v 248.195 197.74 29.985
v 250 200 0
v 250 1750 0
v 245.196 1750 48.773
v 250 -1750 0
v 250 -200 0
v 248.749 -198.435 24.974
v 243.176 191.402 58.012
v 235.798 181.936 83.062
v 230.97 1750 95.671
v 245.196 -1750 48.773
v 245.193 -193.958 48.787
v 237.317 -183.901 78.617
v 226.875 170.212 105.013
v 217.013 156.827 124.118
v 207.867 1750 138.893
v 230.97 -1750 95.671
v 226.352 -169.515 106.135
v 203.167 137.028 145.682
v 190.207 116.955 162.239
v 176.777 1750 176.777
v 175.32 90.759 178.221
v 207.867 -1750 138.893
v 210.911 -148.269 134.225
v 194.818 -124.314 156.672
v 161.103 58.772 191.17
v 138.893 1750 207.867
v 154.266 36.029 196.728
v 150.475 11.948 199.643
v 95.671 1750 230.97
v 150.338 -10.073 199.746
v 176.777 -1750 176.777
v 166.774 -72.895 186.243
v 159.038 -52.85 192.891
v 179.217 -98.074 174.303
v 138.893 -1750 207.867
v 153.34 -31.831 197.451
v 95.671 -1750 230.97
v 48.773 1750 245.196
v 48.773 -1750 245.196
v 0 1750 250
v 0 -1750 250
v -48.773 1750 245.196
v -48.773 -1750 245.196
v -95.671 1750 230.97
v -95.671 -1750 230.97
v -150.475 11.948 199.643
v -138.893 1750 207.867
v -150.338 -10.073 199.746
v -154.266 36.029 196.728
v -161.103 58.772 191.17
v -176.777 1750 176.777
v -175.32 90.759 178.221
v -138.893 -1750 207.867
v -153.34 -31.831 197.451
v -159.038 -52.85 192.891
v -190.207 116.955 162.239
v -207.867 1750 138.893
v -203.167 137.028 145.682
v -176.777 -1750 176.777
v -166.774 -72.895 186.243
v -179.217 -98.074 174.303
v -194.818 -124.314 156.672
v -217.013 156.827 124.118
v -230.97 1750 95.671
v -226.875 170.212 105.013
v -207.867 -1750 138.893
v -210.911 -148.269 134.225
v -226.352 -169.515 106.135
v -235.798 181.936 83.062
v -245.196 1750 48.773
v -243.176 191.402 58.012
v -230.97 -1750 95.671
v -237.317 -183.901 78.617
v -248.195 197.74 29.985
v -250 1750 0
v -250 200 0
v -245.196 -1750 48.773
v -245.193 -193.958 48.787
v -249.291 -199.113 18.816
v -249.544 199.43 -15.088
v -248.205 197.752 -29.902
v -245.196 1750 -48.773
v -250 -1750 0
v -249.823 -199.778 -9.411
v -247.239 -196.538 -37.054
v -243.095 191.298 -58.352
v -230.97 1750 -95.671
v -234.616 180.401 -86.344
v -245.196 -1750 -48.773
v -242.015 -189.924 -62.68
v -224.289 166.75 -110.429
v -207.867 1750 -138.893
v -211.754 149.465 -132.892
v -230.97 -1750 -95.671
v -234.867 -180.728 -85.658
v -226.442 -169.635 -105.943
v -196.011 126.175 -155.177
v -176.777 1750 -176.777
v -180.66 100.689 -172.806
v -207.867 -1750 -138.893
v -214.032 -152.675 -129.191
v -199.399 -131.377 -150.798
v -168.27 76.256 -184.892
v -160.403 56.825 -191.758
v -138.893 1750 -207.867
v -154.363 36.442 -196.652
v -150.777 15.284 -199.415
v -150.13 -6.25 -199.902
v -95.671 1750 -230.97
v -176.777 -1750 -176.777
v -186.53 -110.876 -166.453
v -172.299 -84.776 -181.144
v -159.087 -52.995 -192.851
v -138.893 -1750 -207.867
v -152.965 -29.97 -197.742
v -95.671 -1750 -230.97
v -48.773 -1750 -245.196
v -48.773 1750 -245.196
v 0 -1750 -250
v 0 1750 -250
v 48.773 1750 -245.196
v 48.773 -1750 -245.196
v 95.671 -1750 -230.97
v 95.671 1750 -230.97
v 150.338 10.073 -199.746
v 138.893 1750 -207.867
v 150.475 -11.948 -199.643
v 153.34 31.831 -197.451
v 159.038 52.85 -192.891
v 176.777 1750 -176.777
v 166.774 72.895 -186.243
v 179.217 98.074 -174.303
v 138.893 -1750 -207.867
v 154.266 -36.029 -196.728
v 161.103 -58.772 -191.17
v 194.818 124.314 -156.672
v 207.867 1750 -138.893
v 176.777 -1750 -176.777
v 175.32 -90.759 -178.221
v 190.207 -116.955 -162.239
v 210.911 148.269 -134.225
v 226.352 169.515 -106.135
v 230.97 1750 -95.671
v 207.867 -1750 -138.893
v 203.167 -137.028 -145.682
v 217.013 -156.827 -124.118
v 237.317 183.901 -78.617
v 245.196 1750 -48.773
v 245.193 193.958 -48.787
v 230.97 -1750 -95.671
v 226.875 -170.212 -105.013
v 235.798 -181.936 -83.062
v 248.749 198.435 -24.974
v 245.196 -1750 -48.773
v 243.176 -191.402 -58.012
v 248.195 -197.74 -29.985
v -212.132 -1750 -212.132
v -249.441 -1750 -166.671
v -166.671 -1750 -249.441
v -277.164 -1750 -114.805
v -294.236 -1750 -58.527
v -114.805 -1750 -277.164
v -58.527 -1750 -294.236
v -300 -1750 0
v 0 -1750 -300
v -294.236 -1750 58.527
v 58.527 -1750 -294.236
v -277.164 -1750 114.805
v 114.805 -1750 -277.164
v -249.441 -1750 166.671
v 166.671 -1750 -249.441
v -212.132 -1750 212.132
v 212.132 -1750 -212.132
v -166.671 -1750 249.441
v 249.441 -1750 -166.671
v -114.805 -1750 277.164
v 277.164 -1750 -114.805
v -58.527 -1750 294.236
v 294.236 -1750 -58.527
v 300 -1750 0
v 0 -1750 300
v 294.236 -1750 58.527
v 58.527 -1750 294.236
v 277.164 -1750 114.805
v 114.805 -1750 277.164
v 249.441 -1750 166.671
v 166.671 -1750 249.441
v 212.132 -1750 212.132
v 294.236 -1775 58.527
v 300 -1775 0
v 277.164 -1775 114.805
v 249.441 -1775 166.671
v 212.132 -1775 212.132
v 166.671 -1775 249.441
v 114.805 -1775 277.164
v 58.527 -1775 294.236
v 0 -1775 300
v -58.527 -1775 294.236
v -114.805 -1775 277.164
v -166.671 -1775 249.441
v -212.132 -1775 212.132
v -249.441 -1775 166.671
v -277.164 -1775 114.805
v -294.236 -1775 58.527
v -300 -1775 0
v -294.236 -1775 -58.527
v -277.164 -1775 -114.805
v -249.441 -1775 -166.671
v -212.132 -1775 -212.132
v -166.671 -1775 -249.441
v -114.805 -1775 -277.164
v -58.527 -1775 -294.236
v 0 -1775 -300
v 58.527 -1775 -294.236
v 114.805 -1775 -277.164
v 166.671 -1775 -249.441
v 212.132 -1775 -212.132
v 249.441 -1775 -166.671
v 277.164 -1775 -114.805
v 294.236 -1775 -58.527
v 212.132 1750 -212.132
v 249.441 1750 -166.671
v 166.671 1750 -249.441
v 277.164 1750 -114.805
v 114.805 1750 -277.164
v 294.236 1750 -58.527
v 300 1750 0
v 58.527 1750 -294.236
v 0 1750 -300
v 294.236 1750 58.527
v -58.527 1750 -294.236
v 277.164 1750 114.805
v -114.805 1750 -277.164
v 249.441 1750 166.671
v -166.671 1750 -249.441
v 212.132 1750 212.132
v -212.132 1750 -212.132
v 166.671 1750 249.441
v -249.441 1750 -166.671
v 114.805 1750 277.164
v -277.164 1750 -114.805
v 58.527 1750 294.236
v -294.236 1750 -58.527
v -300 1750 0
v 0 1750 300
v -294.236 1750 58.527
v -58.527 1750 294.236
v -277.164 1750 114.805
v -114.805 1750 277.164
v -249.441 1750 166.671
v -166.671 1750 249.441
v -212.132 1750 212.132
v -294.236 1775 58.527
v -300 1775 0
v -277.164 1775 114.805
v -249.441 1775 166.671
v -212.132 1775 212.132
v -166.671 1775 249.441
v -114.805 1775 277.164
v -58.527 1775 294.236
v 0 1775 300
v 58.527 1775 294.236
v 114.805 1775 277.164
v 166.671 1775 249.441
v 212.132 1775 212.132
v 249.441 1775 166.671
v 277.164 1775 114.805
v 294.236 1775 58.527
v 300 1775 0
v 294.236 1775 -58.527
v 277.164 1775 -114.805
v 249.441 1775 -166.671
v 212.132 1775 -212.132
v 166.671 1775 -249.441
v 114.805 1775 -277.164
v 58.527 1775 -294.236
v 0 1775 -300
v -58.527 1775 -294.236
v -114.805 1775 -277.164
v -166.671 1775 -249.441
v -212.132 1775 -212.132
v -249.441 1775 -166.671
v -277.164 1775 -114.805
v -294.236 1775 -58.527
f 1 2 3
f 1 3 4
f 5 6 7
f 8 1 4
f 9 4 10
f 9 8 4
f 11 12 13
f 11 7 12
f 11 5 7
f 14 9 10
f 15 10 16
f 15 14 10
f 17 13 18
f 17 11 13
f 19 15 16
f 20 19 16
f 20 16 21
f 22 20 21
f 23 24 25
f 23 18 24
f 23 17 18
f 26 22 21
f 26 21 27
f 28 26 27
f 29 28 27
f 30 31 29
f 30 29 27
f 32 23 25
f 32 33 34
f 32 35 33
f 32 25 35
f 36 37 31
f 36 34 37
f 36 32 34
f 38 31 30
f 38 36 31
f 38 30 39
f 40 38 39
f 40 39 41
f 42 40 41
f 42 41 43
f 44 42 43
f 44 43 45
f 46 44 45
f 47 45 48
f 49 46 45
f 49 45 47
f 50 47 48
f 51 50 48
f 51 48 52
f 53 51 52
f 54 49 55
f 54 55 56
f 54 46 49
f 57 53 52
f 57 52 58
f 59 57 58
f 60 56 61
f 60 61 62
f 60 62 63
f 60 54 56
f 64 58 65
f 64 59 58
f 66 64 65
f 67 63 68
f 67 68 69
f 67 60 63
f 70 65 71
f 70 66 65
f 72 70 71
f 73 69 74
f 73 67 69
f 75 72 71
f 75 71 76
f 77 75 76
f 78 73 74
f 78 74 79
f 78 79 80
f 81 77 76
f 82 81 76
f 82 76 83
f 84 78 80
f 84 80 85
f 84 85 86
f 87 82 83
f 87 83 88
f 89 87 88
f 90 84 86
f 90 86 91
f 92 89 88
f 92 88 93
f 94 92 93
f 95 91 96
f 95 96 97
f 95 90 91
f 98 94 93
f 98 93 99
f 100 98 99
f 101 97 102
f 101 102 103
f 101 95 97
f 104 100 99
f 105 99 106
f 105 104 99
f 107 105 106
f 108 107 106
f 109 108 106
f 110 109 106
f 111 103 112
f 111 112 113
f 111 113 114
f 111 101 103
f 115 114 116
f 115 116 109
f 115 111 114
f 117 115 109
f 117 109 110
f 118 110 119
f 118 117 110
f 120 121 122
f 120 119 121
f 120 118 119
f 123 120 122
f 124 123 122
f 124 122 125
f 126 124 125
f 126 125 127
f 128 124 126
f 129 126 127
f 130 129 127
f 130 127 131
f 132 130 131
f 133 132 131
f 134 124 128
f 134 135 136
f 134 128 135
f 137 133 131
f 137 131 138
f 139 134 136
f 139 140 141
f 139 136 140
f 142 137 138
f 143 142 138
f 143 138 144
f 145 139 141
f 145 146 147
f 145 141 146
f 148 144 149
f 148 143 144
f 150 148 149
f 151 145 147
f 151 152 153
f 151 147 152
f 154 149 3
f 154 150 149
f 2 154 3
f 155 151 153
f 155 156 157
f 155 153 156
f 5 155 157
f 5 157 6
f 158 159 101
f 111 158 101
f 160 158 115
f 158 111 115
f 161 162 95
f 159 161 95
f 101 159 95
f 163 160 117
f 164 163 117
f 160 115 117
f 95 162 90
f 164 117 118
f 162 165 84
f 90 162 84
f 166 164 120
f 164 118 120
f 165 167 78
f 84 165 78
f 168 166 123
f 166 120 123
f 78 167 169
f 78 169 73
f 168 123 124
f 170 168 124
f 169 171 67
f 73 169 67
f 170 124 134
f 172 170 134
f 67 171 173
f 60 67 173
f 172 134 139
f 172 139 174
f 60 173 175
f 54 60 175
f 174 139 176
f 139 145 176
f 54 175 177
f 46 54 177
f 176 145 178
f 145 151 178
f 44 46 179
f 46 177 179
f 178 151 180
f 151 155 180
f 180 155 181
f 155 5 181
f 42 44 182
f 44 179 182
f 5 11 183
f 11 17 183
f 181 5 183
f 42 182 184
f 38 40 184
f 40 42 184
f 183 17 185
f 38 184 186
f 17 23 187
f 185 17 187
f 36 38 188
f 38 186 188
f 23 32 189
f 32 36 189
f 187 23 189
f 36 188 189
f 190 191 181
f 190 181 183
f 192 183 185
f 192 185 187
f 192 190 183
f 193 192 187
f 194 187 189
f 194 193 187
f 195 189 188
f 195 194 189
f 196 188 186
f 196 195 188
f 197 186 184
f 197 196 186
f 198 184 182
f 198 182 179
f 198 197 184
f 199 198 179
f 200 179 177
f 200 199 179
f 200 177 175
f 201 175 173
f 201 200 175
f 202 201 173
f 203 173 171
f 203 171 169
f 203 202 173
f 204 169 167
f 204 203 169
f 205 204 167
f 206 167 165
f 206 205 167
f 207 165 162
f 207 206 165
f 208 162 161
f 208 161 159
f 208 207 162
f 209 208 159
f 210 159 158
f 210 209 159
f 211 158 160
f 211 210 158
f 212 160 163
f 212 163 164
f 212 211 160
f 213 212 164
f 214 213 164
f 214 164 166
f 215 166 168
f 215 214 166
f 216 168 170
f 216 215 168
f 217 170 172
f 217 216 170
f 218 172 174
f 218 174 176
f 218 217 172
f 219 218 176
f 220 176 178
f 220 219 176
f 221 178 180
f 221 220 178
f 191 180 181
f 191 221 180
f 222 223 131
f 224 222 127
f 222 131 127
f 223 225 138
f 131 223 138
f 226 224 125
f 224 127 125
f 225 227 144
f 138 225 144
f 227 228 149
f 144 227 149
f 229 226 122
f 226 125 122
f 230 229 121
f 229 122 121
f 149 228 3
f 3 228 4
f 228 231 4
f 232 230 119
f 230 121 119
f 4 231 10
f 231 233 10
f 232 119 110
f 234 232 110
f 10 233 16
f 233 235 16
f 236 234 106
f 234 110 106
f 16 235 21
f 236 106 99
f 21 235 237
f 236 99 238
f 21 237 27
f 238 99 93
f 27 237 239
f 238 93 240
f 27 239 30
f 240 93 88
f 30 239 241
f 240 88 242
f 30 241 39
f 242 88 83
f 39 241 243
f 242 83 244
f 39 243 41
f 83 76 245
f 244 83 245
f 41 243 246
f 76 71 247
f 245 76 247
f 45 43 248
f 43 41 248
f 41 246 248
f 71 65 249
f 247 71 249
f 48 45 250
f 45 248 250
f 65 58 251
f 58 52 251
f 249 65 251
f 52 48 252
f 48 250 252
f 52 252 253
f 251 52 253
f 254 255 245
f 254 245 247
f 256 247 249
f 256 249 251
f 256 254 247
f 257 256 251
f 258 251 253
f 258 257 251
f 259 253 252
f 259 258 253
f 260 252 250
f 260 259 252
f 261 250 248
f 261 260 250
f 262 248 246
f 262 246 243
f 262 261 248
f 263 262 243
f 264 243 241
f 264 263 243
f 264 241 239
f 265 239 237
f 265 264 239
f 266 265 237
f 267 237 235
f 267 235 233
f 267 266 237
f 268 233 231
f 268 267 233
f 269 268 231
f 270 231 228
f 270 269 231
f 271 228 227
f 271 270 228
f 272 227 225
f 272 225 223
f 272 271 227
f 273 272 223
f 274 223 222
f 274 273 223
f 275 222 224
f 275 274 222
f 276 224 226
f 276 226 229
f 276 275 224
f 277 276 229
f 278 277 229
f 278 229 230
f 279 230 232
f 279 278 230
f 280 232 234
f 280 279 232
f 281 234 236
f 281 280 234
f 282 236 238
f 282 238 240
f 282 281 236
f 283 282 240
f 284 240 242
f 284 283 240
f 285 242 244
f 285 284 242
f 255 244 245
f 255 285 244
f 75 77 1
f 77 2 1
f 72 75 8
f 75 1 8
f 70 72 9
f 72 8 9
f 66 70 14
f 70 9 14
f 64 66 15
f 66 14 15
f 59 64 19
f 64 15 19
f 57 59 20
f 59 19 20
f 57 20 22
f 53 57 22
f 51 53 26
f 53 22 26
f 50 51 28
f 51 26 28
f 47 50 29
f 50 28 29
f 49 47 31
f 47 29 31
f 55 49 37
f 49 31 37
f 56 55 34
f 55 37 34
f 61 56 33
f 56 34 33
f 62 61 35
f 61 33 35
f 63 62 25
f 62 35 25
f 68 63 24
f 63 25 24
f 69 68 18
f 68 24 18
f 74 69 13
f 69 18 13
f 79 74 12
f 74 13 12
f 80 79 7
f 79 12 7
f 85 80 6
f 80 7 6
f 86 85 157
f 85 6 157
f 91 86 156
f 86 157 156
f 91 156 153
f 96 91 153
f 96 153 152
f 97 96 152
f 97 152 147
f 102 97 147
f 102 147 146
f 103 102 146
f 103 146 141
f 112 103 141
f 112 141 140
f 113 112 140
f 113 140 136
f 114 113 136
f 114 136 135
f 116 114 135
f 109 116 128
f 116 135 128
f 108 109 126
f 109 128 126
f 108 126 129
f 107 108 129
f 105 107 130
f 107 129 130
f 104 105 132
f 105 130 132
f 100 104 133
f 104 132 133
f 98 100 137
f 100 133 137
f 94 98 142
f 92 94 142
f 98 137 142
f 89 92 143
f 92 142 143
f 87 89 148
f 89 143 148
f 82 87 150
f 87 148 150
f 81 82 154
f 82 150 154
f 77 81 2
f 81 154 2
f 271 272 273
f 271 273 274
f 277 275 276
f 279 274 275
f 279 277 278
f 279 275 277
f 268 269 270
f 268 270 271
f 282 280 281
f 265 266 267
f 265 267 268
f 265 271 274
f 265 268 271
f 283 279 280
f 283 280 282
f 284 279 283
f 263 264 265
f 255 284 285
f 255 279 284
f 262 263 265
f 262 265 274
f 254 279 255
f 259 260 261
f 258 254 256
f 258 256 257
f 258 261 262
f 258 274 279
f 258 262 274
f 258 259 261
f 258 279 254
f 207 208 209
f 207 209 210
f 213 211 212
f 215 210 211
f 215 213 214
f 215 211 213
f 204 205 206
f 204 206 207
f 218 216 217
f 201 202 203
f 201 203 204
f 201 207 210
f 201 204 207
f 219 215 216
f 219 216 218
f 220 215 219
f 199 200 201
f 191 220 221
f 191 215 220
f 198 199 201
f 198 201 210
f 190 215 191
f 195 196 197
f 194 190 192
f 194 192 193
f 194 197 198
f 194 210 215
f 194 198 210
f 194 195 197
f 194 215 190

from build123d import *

# Parameters (mm, degrees)
F0_R     = 250
F1_DEPTH = 1775
F2_R     = 300
F2_R_2   = 250
F3_DEPTH = 25
F4_R     = 300
F4_R_2   = 250
F5_DEPTH = 25
F6_R     = 200
F7_DEPTH = 1233


with BuildPart() as f1:
    # F0 (on Front) → F1 (new body, symmetric)
    with BuildSketch(Plane.XZ):
        Circle(F0_R)
    extrude(amount=F1_DEPTH, both=True)

    # F2 (on face) → F3 (join)
    with BuildSketch(Plane.XZ.offset(1775)):
        Circle(F2_R)
        Circle(F2_R_2, mode=Mode.SUBTRACT)
    extrude(amount=-F3_DEPTH)

    # F4 (on face) → F5 (join)
    with BuildSketch(Plane(origin=(0, 1775, 0), x_dir=(-1, 0, 0), z_dir=(0, 1, 0))):
        Circle(F4_R)
        Circle(F4_R_2, mode=Mode.SUBTRACT)
    extrude(amount=-F5_DEPTH)

    # F6 (on Right) → F7 (cut, symmetric)
    with BuildSketch(Plane.YZ):
        Circle(F6_R)
    extrude(amount=F7_DEPTH, both=True, mode=Mode.SUBTRACT)


solid = f1.part
